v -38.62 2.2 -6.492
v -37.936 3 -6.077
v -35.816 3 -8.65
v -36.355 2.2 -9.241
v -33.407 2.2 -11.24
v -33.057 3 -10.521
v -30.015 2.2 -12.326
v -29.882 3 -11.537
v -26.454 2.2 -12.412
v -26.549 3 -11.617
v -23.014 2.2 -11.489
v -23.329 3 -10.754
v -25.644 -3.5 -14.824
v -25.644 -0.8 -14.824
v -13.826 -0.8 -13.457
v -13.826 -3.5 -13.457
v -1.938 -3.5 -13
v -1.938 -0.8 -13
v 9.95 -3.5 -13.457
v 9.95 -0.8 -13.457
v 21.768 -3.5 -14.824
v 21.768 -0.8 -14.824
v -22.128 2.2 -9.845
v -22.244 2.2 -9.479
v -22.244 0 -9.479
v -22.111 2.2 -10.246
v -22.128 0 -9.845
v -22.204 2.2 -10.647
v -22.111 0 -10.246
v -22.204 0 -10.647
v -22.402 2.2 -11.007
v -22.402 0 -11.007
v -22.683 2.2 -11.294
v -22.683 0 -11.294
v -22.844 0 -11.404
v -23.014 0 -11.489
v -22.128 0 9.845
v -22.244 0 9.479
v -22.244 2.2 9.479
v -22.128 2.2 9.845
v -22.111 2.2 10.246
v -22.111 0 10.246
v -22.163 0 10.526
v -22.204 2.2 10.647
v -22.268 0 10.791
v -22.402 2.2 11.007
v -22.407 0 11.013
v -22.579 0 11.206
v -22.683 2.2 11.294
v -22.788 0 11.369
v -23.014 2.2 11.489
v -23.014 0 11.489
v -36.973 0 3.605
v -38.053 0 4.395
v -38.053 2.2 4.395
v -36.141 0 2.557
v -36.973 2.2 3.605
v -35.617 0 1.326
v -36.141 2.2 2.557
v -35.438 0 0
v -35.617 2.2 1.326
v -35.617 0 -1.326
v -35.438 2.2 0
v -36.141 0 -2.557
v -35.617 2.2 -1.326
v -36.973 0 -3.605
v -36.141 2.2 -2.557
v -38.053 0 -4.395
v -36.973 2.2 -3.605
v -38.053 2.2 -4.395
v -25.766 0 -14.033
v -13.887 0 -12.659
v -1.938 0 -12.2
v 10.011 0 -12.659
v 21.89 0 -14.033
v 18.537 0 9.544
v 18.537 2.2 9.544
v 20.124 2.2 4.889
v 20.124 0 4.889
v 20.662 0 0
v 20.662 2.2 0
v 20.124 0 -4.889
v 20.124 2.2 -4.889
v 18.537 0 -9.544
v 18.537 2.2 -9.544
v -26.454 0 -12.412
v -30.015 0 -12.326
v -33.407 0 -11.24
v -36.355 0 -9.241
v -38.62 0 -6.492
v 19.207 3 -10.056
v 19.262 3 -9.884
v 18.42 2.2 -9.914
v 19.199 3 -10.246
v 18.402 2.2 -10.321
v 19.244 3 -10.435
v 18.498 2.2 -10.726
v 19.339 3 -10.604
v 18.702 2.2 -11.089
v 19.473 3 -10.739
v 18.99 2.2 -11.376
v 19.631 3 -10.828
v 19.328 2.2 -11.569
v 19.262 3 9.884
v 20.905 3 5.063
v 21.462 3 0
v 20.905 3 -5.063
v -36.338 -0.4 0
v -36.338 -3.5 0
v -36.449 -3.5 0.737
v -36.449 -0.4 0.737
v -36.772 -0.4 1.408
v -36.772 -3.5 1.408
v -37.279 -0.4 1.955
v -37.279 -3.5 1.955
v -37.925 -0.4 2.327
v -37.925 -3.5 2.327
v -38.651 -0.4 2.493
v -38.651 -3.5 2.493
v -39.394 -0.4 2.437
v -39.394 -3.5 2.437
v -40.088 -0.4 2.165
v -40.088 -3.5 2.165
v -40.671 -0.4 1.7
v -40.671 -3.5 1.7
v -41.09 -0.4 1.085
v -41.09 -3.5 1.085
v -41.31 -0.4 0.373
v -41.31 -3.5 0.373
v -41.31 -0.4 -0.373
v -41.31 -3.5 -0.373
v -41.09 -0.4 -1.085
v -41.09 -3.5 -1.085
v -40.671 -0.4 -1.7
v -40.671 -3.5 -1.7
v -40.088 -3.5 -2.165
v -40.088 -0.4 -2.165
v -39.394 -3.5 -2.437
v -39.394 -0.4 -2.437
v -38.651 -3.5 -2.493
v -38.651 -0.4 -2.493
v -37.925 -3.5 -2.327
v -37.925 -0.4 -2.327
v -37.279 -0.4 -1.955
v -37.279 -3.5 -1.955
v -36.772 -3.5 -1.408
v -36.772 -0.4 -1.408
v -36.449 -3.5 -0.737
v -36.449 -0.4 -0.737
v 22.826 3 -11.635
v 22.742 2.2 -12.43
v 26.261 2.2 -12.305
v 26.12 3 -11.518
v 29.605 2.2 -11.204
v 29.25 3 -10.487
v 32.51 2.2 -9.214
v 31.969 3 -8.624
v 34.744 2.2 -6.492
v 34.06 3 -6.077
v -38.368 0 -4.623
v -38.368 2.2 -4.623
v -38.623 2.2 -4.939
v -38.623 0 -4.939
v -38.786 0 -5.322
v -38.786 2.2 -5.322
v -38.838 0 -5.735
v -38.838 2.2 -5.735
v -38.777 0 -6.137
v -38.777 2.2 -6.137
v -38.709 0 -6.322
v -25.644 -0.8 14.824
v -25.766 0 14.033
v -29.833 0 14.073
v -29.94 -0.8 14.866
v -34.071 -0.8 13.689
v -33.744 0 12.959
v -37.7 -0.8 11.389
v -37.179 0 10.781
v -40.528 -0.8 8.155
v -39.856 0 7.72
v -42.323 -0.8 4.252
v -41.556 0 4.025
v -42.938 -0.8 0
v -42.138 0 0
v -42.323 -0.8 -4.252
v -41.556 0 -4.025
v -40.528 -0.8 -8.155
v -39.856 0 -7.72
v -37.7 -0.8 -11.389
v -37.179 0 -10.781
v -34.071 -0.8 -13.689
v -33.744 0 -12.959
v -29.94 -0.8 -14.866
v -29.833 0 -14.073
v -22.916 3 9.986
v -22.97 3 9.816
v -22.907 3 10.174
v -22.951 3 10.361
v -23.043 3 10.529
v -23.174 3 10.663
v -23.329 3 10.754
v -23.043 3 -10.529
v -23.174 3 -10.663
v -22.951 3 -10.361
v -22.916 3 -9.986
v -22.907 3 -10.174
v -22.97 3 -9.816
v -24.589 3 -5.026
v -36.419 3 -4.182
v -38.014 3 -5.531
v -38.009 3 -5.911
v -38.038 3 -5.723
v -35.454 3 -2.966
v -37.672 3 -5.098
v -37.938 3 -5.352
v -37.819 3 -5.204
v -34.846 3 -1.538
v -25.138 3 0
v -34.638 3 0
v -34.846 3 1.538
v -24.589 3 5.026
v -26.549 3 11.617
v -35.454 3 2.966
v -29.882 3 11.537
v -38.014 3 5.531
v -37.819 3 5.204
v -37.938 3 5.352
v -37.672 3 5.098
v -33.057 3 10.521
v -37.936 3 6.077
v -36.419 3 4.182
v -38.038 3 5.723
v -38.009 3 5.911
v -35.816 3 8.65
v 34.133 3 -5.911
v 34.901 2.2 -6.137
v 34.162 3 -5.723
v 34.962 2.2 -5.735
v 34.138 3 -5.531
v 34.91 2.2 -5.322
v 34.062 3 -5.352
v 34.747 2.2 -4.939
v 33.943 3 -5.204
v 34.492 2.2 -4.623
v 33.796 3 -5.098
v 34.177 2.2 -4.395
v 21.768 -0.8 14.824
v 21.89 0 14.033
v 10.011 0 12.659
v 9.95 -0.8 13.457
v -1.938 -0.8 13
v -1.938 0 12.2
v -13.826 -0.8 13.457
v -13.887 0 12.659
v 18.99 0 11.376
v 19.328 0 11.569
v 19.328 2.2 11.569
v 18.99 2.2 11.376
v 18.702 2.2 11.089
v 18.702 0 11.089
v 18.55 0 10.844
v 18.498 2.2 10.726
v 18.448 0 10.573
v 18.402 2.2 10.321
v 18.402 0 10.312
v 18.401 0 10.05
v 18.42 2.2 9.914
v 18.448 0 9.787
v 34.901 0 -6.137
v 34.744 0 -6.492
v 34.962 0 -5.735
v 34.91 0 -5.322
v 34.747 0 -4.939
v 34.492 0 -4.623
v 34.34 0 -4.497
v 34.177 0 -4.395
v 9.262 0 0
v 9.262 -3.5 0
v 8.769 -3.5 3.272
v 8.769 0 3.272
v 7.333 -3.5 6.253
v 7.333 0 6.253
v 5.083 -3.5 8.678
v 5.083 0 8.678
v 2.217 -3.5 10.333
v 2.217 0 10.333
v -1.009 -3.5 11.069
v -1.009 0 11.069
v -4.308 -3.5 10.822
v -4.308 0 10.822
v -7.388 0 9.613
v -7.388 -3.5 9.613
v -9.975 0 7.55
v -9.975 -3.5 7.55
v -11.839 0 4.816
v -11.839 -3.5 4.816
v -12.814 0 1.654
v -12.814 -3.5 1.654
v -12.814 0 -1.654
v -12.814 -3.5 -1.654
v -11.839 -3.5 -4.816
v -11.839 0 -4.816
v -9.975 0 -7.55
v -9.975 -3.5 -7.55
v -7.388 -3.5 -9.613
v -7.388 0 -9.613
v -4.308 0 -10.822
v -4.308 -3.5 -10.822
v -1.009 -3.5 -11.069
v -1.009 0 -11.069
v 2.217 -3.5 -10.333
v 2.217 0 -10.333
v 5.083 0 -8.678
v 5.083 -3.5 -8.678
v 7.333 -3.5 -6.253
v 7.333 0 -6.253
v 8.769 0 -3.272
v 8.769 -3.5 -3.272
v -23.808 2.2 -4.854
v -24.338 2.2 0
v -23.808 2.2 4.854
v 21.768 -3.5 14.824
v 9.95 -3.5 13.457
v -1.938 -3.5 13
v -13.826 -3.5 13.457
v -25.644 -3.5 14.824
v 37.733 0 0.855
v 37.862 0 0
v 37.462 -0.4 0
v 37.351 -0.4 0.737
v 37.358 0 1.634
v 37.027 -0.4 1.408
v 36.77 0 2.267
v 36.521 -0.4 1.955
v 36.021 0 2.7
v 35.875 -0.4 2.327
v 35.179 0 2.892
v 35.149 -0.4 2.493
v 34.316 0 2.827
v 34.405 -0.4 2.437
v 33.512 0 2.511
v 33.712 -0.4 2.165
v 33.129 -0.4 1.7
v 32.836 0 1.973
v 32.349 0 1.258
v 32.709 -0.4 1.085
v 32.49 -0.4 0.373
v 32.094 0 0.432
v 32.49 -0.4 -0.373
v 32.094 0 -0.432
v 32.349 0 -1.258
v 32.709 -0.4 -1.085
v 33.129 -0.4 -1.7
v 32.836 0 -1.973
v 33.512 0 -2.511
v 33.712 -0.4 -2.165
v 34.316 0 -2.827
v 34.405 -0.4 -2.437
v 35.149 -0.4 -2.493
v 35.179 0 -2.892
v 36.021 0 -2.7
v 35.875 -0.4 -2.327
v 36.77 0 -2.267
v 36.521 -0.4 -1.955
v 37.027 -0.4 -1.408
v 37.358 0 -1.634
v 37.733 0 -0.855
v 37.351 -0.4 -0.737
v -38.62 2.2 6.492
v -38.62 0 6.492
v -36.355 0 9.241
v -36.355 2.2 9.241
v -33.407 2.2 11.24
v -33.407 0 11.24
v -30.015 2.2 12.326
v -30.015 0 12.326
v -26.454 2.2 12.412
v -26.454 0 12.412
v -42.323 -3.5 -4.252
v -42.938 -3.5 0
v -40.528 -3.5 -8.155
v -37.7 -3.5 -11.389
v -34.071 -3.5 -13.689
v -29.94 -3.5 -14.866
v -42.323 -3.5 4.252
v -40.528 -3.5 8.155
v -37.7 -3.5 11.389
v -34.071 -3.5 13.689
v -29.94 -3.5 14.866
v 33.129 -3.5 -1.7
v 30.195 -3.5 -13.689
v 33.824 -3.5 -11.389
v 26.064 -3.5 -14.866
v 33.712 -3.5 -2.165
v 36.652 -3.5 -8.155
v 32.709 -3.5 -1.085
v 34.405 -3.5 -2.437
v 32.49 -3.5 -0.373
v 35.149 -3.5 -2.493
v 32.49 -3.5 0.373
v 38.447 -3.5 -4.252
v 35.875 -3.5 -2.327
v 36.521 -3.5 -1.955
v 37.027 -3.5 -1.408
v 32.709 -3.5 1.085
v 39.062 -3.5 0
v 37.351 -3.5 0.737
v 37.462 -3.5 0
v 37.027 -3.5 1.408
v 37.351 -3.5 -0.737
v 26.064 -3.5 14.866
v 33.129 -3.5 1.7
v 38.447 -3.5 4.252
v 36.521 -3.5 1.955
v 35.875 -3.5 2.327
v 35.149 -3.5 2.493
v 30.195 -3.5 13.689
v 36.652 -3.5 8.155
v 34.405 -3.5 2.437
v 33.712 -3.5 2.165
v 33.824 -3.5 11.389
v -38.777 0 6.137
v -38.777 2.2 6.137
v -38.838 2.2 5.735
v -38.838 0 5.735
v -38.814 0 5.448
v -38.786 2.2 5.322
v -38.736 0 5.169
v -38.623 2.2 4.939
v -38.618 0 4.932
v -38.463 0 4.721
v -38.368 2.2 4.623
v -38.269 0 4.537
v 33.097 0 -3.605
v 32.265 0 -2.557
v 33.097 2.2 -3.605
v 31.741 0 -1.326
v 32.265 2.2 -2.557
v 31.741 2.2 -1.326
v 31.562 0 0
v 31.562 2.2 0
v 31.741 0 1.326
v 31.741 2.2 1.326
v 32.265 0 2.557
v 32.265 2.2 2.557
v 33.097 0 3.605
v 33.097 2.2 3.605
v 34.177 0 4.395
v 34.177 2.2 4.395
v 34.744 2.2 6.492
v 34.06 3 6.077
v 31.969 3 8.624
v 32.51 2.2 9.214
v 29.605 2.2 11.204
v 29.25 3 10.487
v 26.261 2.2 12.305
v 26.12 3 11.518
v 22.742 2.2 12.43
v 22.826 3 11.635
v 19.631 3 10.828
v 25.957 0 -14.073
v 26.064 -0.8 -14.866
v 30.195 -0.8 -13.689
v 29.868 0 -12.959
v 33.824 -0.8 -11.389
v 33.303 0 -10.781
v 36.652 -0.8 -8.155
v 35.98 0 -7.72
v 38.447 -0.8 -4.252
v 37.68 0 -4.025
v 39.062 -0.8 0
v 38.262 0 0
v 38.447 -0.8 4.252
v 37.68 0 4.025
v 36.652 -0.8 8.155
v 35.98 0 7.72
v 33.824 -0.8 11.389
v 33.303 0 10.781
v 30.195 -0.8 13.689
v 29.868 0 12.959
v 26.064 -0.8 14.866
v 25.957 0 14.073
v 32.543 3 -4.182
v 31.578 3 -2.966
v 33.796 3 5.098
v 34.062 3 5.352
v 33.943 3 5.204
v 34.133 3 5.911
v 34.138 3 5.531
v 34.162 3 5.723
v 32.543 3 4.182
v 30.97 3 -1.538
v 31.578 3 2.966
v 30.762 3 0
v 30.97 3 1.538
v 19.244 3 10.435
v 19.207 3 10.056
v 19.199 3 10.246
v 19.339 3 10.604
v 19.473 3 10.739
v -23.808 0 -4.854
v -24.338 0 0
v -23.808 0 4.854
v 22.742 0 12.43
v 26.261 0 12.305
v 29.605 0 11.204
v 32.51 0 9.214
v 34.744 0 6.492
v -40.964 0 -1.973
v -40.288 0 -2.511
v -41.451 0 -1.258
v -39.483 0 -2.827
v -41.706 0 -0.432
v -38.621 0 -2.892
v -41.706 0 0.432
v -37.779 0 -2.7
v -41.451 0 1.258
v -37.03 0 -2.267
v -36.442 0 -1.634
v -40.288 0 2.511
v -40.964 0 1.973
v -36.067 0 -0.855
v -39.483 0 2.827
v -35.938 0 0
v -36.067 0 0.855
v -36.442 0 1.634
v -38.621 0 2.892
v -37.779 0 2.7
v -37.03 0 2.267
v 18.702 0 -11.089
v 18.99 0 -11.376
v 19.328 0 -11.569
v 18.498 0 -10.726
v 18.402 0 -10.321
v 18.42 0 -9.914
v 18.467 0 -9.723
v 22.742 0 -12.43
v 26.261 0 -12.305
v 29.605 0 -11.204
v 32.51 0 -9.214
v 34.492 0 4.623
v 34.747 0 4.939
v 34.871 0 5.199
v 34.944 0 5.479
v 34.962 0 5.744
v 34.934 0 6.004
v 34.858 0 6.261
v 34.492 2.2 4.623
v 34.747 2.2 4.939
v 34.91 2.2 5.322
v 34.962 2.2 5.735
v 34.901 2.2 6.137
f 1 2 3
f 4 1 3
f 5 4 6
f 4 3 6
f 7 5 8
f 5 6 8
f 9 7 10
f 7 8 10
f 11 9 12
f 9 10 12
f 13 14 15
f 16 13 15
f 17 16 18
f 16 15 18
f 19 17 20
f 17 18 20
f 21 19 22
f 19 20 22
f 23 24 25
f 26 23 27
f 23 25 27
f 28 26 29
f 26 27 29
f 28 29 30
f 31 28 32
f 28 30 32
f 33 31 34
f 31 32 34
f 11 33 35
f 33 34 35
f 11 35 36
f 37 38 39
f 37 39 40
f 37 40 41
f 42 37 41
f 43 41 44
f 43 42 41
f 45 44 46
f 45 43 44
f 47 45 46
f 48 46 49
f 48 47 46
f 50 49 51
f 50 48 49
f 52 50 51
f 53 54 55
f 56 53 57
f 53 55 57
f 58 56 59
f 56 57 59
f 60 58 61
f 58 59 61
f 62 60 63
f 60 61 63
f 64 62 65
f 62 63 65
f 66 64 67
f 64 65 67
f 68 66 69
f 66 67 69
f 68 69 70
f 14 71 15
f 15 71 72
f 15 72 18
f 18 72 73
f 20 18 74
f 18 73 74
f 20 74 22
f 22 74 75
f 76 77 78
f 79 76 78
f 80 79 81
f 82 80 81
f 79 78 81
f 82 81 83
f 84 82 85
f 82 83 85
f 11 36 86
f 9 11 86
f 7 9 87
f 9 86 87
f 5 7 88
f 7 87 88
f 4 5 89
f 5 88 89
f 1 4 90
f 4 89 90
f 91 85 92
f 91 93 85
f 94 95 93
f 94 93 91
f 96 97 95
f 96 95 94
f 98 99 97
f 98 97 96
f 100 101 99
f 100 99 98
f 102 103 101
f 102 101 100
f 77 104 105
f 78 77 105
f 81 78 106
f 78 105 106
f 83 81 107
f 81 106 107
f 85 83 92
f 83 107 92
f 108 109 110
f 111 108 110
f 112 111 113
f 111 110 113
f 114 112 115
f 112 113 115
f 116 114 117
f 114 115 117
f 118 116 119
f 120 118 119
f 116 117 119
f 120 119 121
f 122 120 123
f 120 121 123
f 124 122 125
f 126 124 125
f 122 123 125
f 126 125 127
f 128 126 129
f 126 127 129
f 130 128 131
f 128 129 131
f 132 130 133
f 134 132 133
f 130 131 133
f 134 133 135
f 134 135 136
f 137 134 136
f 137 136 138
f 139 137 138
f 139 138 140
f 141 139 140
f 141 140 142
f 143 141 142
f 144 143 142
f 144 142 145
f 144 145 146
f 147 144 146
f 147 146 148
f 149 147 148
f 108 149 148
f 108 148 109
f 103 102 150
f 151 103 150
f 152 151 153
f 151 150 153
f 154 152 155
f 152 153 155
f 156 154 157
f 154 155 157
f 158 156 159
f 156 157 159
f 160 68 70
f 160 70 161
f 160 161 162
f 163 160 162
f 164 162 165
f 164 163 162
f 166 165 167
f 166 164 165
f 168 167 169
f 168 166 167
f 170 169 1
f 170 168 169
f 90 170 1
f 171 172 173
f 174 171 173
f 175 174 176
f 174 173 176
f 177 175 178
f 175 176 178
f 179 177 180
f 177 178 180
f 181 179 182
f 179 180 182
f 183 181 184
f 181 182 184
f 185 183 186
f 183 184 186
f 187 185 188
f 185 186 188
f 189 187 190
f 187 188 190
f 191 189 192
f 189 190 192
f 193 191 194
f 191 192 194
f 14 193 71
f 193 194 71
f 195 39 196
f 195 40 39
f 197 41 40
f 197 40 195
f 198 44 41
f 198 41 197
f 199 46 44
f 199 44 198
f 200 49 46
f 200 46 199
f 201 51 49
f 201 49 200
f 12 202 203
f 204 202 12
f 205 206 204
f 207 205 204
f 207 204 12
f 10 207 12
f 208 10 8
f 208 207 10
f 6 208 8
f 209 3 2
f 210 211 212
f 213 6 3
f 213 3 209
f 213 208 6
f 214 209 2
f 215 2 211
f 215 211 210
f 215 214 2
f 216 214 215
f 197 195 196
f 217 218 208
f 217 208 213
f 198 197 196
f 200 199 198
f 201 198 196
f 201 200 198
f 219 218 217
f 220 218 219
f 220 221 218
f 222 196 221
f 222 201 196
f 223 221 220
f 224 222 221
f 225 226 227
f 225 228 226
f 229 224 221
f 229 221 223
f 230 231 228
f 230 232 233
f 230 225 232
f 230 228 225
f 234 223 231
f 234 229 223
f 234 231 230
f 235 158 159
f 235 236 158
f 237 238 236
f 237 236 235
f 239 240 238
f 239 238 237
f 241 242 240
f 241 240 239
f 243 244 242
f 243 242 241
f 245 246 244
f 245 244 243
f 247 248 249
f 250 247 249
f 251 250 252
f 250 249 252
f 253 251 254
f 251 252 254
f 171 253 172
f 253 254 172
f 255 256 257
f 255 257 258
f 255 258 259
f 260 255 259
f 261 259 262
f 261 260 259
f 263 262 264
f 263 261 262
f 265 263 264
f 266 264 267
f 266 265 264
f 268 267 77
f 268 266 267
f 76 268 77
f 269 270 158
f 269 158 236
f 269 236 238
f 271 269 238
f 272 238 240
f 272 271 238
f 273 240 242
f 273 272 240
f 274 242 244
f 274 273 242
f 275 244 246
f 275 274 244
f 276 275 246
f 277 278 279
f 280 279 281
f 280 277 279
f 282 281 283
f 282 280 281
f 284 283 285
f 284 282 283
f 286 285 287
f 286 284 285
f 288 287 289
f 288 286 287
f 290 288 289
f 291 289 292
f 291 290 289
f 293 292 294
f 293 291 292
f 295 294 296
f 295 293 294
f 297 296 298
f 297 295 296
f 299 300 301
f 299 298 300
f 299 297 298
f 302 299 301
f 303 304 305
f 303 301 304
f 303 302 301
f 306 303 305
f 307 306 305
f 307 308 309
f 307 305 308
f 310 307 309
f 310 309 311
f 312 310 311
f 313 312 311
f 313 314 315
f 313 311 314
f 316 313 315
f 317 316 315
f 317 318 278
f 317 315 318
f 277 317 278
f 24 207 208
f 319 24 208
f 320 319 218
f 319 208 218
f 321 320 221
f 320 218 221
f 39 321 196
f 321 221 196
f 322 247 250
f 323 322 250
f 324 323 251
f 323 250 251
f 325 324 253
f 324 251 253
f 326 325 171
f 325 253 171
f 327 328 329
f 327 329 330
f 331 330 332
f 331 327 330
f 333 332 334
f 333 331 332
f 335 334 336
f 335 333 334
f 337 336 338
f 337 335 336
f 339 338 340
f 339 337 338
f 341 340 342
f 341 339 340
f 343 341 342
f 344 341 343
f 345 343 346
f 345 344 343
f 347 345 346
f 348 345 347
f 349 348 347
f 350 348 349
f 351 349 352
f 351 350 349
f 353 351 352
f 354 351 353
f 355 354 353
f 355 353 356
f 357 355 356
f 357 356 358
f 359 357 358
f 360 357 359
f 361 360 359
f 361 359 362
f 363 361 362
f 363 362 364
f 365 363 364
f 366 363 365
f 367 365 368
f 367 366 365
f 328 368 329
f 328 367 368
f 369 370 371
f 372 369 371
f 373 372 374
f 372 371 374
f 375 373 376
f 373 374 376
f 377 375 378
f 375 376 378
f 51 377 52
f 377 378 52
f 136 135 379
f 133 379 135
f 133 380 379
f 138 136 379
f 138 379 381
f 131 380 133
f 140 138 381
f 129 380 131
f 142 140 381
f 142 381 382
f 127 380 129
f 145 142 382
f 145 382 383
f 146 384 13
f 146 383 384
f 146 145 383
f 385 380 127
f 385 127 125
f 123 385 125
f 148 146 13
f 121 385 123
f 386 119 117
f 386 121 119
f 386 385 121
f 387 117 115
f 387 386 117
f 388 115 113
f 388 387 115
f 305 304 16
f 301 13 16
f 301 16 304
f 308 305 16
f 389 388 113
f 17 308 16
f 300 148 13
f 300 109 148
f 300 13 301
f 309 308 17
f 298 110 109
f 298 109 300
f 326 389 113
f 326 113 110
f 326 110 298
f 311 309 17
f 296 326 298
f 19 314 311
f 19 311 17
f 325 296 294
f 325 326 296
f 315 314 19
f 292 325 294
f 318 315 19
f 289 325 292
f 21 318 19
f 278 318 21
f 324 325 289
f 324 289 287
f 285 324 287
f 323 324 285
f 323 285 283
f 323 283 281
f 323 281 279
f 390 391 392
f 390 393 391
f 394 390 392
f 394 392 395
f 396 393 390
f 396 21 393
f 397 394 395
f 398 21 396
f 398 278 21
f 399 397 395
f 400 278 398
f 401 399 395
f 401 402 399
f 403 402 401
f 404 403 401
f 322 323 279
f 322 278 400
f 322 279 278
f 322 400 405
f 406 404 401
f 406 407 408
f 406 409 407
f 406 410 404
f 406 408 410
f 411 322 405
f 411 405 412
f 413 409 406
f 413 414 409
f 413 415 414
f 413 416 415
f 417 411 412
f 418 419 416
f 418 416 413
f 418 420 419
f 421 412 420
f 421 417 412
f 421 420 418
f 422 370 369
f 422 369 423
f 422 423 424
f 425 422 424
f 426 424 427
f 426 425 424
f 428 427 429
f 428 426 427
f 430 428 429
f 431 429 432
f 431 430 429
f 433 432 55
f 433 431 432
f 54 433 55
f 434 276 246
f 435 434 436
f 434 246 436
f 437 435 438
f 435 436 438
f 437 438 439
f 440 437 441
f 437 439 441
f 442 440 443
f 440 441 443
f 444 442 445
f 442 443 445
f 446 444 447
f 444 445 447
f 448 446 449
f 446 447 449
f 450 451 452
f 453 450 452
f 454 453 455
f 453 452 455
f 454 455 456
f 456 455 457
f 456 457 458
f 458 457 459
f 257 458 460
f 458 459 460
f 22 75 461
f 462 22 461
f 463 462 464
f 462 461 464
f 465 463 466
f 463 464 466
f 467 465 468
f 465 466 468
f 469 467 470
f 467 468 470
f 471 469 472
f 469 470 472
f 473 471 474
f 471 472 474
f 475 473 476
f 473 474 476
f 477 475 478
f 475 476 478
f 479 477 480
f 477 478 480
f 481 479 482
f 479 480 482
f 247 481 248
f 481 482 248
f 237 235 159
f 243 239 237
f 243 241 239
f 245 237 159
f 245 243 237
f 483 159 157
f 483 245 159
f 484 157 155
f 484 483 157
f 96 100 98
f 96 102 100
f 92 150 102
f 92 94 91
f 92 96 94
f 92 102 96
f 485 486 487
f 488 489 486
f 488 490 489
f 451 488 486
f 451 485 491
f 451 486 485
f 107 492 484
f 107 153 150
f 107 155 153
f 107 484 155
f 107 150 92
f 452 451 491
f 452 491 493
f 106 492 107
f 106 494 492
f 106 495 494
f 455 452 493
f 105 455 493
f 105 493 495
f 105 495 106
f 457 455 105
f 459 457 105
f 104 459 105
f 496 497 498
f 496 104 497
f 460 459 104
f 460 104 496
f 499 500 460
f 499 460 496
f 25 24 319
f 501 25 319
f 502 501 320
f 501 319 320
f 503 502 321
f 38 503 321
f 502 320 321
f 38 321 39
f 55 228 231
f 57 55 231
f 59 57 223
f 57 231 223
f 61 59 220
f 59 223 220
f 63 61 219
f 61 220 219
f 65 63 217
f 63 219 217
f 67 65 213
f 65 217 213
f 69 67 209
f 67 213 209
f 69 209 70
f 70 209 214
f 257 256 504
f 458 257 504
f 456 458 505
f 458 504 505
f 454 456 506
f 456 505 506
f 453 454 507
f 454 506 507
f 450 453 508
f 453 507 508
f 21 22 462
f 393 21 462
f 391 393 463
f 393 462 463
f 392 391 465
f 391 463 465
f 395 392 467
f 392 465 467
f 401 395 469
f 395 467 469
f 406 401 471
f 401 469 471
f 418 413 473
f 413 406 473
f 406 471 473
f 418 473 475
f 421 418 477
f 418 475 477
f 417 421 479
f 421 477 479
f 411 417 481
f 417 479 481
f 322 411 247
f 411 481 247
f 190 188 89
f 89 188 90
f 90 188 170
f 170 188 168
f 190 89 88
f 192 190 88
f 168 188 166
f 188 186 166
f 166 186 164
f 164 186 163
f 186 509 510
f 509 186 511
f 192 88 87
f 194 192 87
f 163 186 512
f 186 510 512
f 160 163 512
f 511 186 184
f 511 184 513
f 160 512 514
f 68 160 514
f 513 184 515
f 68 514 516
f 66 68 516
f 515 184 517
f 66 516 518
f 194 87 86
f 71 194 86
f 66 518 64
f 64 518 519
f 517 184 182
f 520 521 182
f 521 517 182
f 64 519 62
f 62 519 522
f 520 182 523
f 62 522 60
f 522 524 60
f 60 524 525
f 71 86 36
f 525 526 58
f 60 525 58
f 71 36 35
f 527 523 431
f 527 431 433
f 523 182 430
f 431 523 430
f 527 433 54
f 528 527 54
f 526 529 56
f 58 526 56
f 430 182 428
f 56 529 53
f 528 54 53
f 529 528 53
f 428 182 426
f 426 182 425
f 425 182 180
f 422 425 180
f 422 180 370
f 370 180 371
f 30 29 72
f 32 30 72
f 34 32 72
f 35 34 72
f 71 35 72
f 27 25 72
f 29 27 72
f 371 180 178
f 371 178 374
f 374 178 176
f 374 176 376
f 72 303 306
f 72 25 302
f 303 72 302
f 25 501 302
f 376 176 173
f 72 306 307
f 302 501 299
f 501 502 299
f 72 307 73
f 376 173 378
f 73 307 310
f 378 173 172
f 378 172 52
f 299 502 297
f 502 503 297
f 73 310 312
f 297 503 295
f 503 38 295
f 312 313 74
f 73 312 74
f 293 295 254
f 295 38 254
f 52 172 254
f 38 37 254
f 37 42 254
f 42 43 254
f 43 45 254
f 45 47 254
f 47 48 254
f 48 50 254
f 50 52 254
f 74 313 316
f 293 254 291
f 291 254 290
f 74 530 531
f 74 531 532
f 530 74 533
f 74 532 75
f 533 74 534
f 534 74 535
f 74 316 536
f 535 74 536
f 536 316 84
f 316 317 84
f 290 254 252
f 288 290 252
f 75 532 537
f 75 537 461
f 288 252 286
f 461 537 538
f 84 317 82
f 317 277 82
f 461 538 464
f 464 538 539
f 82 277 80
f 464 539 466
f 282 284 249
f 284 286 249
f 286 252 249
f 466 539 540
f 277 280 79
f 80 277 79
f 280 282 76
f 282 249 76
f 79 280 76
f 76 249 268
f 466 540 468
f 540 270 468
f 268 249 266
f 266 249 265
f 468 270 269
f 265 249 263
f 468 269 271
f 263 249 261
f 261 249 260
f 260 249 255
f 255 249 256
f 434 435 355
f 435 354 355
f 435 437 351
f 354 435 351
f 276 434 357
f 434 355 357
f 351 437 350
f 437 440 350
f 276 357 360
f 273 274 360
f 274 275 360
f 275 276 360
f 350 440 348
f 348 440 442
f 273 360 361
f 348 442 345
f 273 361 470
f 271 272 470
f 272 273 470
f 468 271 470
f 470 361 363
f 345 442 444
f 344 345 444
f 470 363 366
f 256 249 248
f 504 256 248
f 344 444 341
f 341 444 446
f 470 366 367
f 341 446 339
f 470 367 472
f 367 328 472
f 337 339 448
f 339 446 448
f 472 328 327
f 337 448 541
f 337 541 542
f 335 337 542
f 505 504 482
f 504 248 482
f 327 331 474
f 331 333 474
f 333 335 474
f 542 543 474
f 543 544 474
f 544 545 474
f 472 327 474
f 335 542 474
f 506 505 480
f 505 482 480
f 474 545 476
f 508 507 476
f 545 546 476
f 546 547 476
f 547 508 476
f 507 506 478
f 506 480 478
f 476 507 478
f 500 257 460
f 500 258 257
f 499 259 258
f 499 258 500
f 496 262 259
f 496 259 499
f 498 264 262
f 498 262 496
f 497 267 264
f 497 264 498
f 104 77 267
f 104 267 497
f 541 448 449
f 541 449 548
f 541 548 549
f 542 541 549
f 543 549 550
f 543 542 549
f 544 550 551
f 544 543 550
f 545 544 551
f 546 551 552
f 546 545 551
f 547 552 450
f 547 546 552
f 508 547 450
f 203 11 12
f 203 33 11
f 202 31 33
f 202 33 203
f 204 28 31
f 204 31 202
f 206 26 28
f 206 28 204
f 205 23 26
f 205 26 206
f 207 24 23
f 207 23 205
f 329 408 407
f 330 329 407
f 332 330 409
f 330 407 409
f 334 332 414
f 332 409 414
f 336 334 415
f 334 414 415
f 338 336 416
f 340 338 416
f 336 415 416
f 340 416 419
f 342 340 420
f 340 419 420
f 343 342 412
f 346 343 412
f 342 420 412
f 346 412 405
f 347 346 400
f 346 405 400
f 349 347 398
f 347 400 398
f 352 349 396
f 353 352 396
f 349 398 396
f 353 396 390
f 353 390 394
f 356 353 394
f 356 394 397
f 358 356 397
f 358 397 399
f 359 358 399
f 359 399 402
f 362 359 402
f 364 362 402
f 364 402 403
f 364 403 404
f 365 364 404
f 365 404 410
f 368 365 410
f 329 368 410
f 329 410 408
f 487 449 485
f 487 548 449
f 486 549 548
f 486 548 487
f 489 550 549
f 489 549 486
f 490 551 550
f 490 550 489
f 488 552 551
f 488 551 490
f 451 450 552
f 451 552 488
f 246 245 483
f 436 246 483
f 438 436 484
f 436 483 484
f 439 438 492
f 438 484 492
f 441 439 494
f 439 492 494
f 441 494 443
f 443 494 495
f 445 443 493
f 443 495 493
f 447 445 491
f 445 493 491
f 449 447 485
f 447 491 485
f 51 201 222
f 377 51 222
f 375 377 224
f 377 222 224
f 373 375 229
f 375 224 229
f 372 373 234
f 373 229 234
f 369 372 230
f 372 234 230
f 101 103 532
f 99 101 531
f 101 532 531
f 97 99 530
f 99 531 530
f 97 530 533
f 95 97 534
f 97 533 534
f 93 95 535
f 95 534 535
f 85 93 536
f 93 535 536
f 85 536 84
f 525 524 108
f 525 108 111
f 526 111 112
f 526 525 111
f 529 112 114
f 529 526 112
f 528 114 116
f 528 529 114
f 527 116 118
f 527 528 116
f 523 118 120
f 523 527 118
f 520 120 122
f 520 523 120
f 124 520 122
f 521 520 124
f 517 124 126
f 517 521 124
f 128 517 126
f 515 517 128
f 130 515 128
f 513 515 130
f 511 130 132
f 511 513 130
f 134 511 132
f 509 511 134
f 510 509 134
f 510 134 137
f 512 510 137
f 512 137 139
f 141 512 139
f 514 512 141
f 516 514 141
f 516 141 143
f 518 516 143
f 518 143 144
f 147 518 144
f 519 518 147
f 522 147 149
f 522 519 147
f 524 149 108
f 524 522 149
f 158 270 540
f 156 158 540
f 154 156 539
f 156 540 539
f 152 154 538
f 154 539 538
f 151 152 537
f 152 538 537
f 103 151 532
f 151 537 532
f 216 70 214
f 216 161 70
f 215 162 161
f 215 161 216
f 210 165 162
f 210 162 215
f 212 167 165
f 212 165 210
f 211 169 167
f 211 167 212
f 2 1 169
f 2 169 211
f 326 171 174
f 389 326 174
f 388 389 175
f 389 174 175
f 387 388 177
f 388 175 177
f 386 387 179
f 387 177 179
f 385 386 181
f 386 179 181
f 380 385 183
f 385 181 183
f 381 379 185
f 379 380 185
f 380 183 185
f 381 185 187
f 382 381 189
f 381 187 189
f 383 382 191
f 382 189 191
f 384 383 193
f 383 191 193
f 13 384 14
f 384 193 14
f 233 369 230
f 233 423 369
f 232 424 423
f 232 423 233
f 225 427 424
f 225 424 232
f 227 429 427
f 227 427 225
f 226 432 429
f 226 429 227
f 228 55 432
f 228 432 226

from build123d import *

# Parameters (mm, degrees)
F0_R      = 11.1
F1_DEPTH  = 7
F2_SIZE   = 0.8
F3_R      = 12.5
F4_DEPTH  = 3
F5_R      = 12.5
F6_DEPTH  = 3
F8_R      = 22.5
F9_DEPTH  = 3
F10_R     = 22.5
F11_DEPTH = 3
F12_R     = 5
F13_DEPTH = 3
F14_R     = 5
F15_DEPTH = 3
F16_R     = 5
F17_DEPTH = 3
F18_R     = 5
F19_DEPTH = 3
F20_R     = 1.5
F21_R     = 2.5
F22_DEPTH = 25
F23_R     = 2.5
F24_DEPTH = 25
F25_SIZE  = 0.4
F26_SIZE  = 0.8
F27_W     = 103.2572649419
F27_H     = 49.3412911892
F28_DEPTH = 6.5


with BuildPart() as f1:
    # F0 (on Front) → F1 (new body)
    with BuildSketch(Plane.XZ):
        with BuildLine():
            ThreePointArc((21.7678643686, 14.8235294118), (-1.9380179843, 13), (-25.6439003372, 14.8235294118))
            ThreePointArc((-25.6439003372, 14.8235294118), (-42.9380179843, 0), (-25.6439003372, -14.8235294118))
            ThreePointArc((-25.6439003372, -14.8235294118), (-1.9380179843, -13), (21.7678643686, -14.8235294118))
            ThreePointArc((21.7678643686, -14.8235294118), (39.0619820157, 0), (21.7678643686, 14.8235294118))
        make_face()
        with Locations((-1.8380179843, 0)):
            Circle(F0_R, mode=Mode.SUBTRACT)
    extrude(amount=F1_DEPTH)

    # F2
    f2_edges = [f1.edges().sort_by_distance(p)[0] for p in [
        (-42.938018, -7, 0),
        (-1.938018, -7, -13),
        (-1.938018, 0, -13),
    ]]
    chamfer(f2_edges, length=F2_SIZE)

    # F3 (on face) → F4 (join)
    with BuildSketch(Plane.XZ.offset(7)):
        with Locations((-27.9380179843, 0)):
            Circle(F3_R)
        with Locations((24.0619820157, 0)):
            Circle(F3_R)
    extrude(amount=F4_DEPTH)

    # F5 (on face) → F6 (join)
    with BuildSketch(Plane(origin=(0, 0, 0), x_dir=(-1, 0, 0), z_dir=(0, 1, 0))):
        with Locations((-24.0619820157, 0)):
            Circle(F5_R)
        with Locations((27.9380179843, 0)):
            Circle(F5_R)
    extrude(amount=F6_DEPTH)

    # F8 (on face) → F9 (cut)
    with BuildSketch(Plane.XZ.offset(10)):
        with Locations((-1.8380179843, 0)):
            Circle(F8_R)
    extrude(amount=-F9_DEPTH, mode=Mode.SUBTRACT)

    # F10 (on face) → F11 (cut)
    with BuildSketch(Plane(origin=(0, 3, 0), x_dir=(-1, 0, 0), z_dir=(0, 1, 0))):
        with Locations((1.8380179843, 0)):
            Circle(F10_R)
    extrude(amount=-F11_DEPTH, mode=Mode.SUBTRACT)

    # F12 (on face) → F13 (cut)
    with BuildSketch(Plane(origin=(0, 3, 0), x_dir=(-1, 0, 0), z_dir=(0, 1, 0))):
        with Locations((-36.5619820157, 0)):
            Circle(F12_R)
    extrude(amount=-F13_DEPTH, mode=Mode.SUBTRACT)

    # F14 (on face) → F15 (cut)
    with BuildSketch(Plane(origin=(0, 3, 0), x_dir=(-1, 0, 0), z_dir=(0, 1, 0))):
        with Locations((40.4380179843, 0)):
            Circle(F14_R)
    extrude(amount=-F15_DEPTH, mode=Mode.SUBTRACT)

    # F16 (on face) → F17 (cut)
    with BuildSketch(Plane.XZ.offset(10)):
        with Locations((-40.4380179843, 0)):
            Circle(F16_R)
    extrude(amount=-F17_DEPTH, mode=Mode.SUBTRACT)

    # F18 (on face) → F19 (cut)
    with BuildSketch(Plane.XZ.offset(10)):
        with Locations((36.5617908537, 0)):
            Circle(F18_R)
    extrude(amount=-F19_DEPTH, mode=Mode.SUBTRACT)

    # F20
    f20_edges = [f1.edges().sort_by_distance(p)[0] for p in [
        (-39.438018, -8.5, 4.898979),
        (-39.438018, -8.5, -4.898979),
        (-21.592999, -8.5, -10.769899),
        (-21.592999, -8.5, 10.769899),
        (17.868739, -8.5, 10.857888),
        (17.868739, -8.5, -10.857888),
        (35.561967, -8.5, -4.899015),
        (35.561967, -8.5, 4.899015),
        (-21.592999, 1.5, -10.769899),
        (-21.592999, 1.5, 10.769899),
        (-39.438018, 1.5, 4.898979),
        (-39.438018, 1.5, -4.898979),
        (17.868739, 1.5, -10.857888),
        (17.868739, 1.5, 10.857888),
        (35.561982, 1.5, -4.898979),
        (35.561982, 1.5, 4.898979),
    ]]
    fillet(f20_edges, radius=F20_R)

    # F21 (on face) → F22 (cut)
    with BuildSketch(Plane.XZ.offset(7)):
        with Locations((-38.8380179843, 0)):
            Circle(F21_R)
    extrude(amount=-F22_DEPTH, mode=Mode.SUBTRACT)

    # F23 (on face) → F24 (cut)
    with BuildSketch(Plane.XZ.offset(7)):
        with Locations((34.9617908537, 0)):
            Circle(F23_R)
    extrude(amount=-F24_DEPTH, mode=Mode.SUBTRACT)

    # F25
    f25_edges = [f1.edges().sort_by_distance(p)[0] for p in [
        (-41.338018, -7, 0),
        (32.461791, -7, 0),
        (32.461791, 0, 0),
        (-41.338018, 0, 0),
    ]]
    chamfer(f25_edges, length=F25_SIZE)

    # F26
    f26_edges = [f1.edges().sort_by_distance(p)[0] for p in [
        (27.97166, -10, 11.872844),
        (18.498441, -10, 10.725925),
        (34.910055, -10, 5.322137),
        (20.661982, -10, 0),
        (31.561791, -10, 0),
        (18.498441, -10, -10.725925),
        (34.910055, -10, -5.322137),
        (27.97166, -10, -11.872844),
        (-24.338018, -10, 0),
        (-22.203581, -10, 10.646558),
        (-22.203581, -10, -10.646558),
        (-31.749718, -10, 11.904661),
        (-31.749718, -10, -11.904661),
        (-38.786142, -10, 5.322071),
        (-38.786142, -10, -5.322071),
        (-35.438018, -10, 0),
        (-24.338018, 3, 0),
        (-22.203581, 3, -10.646558),
        (-22.203581, 3, 10.646558),
        (-31.749718, 3, -11.904661),
        (-31.749718, 3, 11.904661),
        (-38.786142, 3, -5.322071),
        (-38.786142, 3, 5.322071),
        (-35.438018, 3, 0),
        (20.661982, 3, 0),
        (18.498441, 3, 10.725925),
        (18.498441, 3, -10.725925),
        (27.971709, 3, 11.872828),
        (27.971709, 3, -11.872828),
        (34.910106, 3, 5.322071),
        (34.910106, 3, -5.322071),
        (31.561982, 3, 0),
    ]]
    chamfer(f26_edges, length=F26_SIZE)

    # F27 (on face) → F28 (cut)
    with BuildSketch(Plane.XZ.offset(10)):
        with Locations((-3.2676365227, 0)):
            Rectangle(F27_W, F27_H)
    extrude(amount=-F28_DEPTH, mode=Mode.SUBTRACT)


solid = f1.part
